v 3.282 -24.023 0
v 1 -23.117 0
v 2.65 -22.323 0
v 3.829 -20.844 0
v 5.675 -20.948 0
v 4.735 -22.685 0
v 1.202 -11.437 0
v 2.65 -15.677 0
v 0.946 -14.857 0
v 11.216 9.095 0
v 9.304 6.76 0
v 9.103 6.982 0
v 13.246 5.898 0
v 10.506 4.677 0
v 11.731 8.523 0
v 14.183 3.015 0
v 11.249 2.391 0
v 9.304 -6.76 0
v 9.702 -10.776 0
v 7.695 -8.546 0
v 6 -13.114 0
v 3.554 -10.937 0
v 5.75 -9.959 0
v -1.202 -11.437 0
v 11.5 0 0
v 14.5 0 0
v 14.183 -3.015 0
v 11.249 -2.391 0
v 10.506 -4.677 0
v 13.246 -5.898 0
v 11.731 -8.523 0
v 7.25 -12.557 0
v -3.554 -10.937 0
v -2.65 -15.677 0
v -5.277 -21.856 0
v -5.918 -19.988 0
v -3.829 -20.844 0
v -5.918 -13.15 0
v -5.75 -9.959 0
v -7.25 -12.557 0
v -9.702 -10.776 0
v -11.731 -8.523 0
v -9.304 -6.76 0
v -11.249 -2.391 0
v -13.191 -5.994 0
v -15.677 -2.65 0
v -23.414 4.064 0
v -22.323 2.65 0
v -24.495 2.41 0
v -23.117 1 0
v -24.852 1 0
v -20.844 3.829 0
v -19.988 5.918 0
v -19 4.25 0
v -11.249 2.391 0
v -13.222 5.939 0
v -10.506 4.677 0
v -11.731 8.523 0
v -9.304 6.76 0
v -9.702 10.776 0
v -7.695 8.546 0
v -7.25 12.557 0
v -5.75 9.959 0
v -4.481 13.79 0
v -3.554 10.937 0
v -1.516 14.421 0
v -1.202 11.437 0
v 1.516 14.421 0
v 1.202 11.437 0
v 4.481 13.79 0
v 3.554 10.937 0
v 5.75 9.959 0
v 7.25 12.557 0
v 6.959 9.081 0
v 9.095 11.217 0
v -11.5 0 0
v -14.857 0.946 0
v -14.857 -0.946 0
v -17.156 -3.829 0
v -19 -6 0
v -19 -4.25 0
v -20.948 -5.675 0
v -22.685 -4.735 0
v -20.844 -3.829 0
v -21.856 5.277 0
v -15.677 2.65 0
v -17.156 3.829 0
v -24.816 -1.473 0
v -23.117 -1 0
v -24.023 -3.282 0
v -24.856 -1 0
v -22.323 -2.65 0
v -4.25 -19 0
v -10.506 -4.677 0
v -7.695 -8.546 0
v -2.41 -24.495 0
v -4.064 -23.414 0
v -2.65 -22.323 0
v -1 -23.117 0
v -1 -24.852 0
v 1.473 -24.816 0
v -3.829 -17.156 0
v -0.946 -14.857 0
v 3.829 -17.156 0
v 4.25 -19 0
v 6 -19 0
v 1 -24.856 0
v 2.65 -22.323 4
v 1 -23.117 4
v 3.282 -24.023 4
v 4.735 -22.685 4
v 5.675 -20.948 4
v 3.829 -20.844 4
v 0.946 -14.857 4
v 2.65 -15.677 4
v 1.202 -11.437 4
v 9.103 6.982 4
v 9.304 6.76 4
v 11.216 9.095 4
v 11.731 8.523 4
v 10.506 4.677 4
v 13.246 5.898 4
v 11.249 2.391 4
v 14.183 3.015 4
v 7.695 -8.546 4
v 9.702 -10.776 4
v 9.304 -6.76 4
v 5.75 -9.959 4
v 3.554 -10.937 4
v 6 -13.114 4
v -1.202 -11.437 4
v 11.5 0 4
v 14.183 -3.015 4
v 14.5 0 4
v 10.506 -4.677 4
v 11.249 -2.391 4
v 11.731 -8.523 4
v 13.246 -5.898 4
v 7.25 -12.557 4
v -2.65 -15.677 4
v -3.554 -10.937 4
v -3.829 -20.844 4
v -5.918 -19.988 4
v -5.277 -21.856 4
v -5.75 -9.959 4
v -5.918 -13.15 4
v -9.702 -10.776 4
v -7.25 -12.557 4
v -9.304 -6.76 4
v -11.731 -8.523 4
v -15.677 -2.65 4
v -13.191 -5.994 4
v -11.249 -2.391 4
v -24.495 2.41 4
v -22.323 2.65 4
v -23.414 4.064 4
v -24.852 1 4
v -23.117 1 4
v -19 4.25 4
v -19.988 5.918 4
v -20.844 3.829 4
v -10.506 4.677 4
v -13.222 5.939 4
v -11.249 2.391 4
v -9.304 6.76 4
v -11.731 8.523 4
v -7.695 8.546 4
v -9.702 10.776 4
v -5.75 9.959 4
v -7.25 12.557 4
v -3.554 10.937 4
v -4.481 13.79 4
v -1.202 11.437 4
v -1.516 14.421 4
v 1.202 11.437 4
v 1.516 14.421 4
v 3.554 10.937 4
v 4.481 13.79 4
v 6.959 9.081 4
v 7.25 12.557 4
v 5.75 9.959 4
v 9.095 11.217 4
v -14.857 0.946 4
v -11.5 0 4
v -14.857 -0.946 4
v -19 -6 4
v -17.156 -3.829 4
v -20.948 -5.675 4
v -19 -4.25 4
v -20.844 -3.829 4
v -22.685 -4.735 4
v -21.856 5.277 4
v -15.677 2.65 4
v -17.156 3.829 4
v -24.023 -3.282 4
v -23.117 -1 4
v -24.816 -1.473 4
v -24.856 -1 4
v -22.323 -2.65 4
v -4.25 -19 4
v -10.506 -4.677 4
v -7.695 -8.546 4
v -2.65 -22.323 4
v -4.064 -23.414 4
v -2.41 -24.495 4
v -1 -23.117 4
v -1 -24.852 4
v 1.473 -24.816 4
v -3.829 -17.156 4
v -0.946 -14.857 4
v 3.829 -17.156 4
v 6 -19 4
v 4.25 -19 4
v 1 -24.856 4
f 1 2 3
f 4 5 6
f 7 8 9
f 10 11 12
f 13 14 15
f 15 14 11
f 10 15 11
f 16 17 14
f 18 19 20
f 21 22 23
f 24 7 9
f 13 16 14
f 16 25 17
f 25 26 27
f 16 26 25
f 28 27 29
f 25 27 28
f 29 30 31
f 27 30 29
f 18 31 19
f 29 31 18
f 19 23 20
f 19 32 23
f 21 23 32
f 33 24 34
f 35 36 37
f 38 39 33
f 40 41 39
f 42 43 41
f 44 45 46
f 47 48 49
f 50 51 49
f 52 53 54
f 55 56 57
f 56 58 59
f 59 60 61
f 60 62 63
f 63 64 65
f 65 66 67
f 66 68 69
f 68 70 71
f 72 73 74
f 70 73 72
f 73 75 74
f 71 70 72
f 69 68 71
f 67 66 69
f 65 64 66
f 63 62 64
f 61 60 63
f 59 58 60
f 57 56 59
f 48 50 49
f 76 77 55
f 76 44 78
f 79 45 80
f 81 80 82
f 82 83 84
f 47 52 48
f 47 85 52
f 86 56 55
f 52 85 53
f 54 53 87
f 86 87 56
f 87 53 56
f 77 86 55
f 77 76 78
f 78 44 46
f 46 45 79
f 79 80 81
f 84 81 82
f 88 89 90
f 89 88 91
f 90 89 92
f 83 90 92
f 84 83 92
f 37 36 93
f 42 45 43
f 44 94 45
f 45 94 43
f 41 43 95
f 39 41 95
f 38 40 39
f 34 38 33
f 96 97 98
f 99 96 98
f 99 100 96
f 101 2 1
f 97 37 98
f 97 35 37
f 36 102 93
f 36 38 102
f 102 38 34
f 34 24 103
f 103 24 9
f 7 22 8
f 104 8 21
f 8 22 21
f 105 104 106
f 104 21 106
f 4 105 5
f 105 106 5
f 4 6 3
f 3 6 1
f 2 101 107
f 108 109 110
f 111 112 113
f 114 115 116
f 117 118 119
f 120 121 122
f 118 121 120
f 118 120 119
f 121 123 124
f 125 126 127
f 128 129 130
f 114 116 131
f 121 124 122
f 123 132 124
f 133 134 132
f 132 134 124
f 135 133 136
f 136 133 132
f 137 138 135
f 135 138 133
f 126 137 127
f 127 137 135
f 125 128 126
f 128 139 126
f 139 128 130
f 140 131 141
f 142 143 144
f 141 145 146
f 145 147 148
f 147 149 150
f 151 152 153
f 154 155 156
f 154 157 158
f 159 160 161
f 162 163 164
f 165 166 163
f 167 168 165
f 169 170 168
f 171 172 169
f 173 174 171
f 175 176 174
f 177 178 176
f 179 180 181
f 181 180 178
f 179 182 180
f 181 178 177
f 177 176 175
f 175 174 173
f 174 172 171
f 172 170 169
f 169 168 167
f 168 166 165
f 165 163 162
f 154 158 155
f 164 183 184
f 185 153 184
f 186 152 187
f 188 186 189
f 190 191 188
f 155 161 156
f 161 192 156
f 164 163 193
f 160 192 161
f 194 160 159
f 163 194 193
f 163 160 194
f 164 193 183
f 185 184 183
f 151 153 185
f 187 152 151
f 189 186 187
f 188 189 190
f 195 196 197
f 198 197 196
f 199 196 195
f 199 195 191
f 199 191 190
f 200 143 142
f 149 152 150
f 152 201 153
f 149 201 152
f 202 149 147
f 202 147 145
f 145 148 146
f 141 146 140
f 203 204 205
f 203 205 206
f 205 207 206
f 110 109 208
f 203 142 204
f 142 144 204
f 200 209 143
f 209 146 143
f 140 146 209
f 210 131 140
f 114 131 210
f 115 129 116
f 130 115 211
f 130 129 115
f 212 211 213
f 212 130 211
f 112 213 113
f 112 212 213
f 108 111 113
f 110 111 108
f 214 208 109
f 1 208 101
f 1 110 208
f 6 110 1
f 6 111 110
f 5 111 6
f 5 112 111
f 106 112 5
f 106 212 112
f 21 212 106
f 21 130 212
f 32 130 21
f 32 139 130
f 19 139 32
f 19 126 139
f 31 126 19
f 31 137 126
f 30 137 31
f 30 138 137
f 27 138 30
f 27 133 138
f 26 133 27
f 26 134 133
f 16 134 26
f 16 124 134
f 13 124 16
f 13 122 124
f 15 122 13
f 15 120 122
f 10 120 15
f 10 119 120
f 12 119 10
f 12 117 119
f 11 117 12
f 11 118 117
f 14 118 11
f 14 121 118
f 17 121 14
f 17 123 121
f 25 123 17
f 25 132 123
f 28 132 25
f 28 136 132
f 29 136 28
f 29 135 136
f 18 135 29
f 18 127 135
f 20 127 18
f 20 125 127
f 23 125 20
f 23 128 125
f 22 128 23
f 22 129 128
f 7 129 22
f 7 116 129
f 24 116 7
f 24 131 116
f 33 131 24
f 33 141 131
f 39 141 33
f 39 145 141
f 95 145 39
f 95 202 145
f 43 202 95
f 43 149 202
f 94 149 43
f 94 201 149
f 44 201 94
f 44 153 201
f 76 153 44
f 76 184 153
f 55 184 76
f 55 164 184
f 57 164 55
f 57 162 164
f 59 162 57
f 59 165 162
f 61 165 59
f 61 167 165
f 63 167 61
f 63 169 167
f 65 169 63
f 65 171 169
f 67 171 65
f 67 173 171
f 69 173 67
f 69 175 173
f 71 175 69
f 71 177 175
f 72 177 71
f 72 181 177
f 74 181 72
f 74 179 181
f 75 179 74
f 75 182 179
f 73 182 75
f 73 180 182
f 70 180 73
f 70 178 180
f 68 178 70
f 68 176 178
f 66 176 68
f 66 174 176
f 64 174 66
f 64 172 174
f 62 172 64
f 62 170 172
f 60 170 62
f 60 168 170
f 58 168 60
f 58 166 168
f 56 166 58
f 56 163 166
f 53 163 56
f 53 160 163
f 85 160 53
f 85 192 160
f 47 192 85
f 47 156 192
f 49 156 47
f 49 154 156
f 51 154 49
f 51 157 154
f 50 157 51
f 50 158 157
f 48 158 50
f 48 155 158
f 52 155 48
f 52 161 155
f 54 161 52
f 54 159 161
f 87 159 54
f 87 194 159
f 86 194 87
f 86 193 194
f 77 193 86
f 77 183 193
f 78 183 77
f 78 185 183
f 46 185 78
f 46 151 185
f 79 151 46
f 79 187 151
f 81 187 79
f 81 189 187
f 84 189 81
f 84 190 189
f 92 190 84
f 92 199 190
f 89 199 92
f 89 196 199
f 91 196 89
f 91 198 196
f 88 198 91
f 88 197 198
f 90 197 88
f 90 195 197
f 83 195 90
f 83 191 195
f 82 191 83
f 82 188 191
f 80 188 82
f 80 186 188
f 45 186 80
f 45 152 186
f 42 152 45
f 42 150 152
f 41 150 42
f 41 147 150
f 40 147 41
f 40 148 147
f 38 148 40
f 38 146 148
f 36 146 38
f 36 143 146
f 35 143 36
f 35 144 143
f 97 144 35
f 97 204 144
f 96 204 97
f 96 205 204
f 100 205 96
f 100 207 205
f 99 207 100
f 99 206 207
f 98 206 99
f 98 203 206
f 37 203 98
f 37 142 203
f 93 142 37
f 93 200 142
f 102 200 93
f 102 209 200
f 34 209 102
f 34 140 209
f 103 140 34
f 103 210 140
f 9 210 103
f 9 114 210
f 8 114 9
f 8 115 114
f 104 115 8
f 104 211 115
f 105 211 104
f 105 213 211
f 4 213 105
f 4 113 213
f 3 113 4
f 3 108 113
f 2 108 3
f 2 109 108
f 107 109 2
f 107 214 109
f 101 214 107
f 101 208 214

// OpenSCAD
beam_tube_diameter = 24;
laser_diameter = 9;
laser_offset = 19;

linear_extrude(4) {
	difference() {
		union() {
			circle(d = beam_tube_diameter + 5);

			for (a = [0, -90]) {
				hull() {
					circle(d = laser_diameter + 3);

					rotate([0, 0, a]) {
						translate([0, -laser_offset]) {
							circle(d = laser_diameter + 3);
						}
					}
				}
			}
		}

		circle(d = beam_tube_diameter - 1);

		rotate([0, 0, -45]) {
			translate([0, 13]) {
				square([3, 5], center = true);
			}
		}

		for (a = [0, -90]) {
			rotate([0, 0, a]) {
				translate([0, -laser_offset]) {
					circle(d = laser_diameter - 0.5);

					translate([0, -5]) {
						square([2, 3], center = true);
					}
				}
			}
		}
	}
}
